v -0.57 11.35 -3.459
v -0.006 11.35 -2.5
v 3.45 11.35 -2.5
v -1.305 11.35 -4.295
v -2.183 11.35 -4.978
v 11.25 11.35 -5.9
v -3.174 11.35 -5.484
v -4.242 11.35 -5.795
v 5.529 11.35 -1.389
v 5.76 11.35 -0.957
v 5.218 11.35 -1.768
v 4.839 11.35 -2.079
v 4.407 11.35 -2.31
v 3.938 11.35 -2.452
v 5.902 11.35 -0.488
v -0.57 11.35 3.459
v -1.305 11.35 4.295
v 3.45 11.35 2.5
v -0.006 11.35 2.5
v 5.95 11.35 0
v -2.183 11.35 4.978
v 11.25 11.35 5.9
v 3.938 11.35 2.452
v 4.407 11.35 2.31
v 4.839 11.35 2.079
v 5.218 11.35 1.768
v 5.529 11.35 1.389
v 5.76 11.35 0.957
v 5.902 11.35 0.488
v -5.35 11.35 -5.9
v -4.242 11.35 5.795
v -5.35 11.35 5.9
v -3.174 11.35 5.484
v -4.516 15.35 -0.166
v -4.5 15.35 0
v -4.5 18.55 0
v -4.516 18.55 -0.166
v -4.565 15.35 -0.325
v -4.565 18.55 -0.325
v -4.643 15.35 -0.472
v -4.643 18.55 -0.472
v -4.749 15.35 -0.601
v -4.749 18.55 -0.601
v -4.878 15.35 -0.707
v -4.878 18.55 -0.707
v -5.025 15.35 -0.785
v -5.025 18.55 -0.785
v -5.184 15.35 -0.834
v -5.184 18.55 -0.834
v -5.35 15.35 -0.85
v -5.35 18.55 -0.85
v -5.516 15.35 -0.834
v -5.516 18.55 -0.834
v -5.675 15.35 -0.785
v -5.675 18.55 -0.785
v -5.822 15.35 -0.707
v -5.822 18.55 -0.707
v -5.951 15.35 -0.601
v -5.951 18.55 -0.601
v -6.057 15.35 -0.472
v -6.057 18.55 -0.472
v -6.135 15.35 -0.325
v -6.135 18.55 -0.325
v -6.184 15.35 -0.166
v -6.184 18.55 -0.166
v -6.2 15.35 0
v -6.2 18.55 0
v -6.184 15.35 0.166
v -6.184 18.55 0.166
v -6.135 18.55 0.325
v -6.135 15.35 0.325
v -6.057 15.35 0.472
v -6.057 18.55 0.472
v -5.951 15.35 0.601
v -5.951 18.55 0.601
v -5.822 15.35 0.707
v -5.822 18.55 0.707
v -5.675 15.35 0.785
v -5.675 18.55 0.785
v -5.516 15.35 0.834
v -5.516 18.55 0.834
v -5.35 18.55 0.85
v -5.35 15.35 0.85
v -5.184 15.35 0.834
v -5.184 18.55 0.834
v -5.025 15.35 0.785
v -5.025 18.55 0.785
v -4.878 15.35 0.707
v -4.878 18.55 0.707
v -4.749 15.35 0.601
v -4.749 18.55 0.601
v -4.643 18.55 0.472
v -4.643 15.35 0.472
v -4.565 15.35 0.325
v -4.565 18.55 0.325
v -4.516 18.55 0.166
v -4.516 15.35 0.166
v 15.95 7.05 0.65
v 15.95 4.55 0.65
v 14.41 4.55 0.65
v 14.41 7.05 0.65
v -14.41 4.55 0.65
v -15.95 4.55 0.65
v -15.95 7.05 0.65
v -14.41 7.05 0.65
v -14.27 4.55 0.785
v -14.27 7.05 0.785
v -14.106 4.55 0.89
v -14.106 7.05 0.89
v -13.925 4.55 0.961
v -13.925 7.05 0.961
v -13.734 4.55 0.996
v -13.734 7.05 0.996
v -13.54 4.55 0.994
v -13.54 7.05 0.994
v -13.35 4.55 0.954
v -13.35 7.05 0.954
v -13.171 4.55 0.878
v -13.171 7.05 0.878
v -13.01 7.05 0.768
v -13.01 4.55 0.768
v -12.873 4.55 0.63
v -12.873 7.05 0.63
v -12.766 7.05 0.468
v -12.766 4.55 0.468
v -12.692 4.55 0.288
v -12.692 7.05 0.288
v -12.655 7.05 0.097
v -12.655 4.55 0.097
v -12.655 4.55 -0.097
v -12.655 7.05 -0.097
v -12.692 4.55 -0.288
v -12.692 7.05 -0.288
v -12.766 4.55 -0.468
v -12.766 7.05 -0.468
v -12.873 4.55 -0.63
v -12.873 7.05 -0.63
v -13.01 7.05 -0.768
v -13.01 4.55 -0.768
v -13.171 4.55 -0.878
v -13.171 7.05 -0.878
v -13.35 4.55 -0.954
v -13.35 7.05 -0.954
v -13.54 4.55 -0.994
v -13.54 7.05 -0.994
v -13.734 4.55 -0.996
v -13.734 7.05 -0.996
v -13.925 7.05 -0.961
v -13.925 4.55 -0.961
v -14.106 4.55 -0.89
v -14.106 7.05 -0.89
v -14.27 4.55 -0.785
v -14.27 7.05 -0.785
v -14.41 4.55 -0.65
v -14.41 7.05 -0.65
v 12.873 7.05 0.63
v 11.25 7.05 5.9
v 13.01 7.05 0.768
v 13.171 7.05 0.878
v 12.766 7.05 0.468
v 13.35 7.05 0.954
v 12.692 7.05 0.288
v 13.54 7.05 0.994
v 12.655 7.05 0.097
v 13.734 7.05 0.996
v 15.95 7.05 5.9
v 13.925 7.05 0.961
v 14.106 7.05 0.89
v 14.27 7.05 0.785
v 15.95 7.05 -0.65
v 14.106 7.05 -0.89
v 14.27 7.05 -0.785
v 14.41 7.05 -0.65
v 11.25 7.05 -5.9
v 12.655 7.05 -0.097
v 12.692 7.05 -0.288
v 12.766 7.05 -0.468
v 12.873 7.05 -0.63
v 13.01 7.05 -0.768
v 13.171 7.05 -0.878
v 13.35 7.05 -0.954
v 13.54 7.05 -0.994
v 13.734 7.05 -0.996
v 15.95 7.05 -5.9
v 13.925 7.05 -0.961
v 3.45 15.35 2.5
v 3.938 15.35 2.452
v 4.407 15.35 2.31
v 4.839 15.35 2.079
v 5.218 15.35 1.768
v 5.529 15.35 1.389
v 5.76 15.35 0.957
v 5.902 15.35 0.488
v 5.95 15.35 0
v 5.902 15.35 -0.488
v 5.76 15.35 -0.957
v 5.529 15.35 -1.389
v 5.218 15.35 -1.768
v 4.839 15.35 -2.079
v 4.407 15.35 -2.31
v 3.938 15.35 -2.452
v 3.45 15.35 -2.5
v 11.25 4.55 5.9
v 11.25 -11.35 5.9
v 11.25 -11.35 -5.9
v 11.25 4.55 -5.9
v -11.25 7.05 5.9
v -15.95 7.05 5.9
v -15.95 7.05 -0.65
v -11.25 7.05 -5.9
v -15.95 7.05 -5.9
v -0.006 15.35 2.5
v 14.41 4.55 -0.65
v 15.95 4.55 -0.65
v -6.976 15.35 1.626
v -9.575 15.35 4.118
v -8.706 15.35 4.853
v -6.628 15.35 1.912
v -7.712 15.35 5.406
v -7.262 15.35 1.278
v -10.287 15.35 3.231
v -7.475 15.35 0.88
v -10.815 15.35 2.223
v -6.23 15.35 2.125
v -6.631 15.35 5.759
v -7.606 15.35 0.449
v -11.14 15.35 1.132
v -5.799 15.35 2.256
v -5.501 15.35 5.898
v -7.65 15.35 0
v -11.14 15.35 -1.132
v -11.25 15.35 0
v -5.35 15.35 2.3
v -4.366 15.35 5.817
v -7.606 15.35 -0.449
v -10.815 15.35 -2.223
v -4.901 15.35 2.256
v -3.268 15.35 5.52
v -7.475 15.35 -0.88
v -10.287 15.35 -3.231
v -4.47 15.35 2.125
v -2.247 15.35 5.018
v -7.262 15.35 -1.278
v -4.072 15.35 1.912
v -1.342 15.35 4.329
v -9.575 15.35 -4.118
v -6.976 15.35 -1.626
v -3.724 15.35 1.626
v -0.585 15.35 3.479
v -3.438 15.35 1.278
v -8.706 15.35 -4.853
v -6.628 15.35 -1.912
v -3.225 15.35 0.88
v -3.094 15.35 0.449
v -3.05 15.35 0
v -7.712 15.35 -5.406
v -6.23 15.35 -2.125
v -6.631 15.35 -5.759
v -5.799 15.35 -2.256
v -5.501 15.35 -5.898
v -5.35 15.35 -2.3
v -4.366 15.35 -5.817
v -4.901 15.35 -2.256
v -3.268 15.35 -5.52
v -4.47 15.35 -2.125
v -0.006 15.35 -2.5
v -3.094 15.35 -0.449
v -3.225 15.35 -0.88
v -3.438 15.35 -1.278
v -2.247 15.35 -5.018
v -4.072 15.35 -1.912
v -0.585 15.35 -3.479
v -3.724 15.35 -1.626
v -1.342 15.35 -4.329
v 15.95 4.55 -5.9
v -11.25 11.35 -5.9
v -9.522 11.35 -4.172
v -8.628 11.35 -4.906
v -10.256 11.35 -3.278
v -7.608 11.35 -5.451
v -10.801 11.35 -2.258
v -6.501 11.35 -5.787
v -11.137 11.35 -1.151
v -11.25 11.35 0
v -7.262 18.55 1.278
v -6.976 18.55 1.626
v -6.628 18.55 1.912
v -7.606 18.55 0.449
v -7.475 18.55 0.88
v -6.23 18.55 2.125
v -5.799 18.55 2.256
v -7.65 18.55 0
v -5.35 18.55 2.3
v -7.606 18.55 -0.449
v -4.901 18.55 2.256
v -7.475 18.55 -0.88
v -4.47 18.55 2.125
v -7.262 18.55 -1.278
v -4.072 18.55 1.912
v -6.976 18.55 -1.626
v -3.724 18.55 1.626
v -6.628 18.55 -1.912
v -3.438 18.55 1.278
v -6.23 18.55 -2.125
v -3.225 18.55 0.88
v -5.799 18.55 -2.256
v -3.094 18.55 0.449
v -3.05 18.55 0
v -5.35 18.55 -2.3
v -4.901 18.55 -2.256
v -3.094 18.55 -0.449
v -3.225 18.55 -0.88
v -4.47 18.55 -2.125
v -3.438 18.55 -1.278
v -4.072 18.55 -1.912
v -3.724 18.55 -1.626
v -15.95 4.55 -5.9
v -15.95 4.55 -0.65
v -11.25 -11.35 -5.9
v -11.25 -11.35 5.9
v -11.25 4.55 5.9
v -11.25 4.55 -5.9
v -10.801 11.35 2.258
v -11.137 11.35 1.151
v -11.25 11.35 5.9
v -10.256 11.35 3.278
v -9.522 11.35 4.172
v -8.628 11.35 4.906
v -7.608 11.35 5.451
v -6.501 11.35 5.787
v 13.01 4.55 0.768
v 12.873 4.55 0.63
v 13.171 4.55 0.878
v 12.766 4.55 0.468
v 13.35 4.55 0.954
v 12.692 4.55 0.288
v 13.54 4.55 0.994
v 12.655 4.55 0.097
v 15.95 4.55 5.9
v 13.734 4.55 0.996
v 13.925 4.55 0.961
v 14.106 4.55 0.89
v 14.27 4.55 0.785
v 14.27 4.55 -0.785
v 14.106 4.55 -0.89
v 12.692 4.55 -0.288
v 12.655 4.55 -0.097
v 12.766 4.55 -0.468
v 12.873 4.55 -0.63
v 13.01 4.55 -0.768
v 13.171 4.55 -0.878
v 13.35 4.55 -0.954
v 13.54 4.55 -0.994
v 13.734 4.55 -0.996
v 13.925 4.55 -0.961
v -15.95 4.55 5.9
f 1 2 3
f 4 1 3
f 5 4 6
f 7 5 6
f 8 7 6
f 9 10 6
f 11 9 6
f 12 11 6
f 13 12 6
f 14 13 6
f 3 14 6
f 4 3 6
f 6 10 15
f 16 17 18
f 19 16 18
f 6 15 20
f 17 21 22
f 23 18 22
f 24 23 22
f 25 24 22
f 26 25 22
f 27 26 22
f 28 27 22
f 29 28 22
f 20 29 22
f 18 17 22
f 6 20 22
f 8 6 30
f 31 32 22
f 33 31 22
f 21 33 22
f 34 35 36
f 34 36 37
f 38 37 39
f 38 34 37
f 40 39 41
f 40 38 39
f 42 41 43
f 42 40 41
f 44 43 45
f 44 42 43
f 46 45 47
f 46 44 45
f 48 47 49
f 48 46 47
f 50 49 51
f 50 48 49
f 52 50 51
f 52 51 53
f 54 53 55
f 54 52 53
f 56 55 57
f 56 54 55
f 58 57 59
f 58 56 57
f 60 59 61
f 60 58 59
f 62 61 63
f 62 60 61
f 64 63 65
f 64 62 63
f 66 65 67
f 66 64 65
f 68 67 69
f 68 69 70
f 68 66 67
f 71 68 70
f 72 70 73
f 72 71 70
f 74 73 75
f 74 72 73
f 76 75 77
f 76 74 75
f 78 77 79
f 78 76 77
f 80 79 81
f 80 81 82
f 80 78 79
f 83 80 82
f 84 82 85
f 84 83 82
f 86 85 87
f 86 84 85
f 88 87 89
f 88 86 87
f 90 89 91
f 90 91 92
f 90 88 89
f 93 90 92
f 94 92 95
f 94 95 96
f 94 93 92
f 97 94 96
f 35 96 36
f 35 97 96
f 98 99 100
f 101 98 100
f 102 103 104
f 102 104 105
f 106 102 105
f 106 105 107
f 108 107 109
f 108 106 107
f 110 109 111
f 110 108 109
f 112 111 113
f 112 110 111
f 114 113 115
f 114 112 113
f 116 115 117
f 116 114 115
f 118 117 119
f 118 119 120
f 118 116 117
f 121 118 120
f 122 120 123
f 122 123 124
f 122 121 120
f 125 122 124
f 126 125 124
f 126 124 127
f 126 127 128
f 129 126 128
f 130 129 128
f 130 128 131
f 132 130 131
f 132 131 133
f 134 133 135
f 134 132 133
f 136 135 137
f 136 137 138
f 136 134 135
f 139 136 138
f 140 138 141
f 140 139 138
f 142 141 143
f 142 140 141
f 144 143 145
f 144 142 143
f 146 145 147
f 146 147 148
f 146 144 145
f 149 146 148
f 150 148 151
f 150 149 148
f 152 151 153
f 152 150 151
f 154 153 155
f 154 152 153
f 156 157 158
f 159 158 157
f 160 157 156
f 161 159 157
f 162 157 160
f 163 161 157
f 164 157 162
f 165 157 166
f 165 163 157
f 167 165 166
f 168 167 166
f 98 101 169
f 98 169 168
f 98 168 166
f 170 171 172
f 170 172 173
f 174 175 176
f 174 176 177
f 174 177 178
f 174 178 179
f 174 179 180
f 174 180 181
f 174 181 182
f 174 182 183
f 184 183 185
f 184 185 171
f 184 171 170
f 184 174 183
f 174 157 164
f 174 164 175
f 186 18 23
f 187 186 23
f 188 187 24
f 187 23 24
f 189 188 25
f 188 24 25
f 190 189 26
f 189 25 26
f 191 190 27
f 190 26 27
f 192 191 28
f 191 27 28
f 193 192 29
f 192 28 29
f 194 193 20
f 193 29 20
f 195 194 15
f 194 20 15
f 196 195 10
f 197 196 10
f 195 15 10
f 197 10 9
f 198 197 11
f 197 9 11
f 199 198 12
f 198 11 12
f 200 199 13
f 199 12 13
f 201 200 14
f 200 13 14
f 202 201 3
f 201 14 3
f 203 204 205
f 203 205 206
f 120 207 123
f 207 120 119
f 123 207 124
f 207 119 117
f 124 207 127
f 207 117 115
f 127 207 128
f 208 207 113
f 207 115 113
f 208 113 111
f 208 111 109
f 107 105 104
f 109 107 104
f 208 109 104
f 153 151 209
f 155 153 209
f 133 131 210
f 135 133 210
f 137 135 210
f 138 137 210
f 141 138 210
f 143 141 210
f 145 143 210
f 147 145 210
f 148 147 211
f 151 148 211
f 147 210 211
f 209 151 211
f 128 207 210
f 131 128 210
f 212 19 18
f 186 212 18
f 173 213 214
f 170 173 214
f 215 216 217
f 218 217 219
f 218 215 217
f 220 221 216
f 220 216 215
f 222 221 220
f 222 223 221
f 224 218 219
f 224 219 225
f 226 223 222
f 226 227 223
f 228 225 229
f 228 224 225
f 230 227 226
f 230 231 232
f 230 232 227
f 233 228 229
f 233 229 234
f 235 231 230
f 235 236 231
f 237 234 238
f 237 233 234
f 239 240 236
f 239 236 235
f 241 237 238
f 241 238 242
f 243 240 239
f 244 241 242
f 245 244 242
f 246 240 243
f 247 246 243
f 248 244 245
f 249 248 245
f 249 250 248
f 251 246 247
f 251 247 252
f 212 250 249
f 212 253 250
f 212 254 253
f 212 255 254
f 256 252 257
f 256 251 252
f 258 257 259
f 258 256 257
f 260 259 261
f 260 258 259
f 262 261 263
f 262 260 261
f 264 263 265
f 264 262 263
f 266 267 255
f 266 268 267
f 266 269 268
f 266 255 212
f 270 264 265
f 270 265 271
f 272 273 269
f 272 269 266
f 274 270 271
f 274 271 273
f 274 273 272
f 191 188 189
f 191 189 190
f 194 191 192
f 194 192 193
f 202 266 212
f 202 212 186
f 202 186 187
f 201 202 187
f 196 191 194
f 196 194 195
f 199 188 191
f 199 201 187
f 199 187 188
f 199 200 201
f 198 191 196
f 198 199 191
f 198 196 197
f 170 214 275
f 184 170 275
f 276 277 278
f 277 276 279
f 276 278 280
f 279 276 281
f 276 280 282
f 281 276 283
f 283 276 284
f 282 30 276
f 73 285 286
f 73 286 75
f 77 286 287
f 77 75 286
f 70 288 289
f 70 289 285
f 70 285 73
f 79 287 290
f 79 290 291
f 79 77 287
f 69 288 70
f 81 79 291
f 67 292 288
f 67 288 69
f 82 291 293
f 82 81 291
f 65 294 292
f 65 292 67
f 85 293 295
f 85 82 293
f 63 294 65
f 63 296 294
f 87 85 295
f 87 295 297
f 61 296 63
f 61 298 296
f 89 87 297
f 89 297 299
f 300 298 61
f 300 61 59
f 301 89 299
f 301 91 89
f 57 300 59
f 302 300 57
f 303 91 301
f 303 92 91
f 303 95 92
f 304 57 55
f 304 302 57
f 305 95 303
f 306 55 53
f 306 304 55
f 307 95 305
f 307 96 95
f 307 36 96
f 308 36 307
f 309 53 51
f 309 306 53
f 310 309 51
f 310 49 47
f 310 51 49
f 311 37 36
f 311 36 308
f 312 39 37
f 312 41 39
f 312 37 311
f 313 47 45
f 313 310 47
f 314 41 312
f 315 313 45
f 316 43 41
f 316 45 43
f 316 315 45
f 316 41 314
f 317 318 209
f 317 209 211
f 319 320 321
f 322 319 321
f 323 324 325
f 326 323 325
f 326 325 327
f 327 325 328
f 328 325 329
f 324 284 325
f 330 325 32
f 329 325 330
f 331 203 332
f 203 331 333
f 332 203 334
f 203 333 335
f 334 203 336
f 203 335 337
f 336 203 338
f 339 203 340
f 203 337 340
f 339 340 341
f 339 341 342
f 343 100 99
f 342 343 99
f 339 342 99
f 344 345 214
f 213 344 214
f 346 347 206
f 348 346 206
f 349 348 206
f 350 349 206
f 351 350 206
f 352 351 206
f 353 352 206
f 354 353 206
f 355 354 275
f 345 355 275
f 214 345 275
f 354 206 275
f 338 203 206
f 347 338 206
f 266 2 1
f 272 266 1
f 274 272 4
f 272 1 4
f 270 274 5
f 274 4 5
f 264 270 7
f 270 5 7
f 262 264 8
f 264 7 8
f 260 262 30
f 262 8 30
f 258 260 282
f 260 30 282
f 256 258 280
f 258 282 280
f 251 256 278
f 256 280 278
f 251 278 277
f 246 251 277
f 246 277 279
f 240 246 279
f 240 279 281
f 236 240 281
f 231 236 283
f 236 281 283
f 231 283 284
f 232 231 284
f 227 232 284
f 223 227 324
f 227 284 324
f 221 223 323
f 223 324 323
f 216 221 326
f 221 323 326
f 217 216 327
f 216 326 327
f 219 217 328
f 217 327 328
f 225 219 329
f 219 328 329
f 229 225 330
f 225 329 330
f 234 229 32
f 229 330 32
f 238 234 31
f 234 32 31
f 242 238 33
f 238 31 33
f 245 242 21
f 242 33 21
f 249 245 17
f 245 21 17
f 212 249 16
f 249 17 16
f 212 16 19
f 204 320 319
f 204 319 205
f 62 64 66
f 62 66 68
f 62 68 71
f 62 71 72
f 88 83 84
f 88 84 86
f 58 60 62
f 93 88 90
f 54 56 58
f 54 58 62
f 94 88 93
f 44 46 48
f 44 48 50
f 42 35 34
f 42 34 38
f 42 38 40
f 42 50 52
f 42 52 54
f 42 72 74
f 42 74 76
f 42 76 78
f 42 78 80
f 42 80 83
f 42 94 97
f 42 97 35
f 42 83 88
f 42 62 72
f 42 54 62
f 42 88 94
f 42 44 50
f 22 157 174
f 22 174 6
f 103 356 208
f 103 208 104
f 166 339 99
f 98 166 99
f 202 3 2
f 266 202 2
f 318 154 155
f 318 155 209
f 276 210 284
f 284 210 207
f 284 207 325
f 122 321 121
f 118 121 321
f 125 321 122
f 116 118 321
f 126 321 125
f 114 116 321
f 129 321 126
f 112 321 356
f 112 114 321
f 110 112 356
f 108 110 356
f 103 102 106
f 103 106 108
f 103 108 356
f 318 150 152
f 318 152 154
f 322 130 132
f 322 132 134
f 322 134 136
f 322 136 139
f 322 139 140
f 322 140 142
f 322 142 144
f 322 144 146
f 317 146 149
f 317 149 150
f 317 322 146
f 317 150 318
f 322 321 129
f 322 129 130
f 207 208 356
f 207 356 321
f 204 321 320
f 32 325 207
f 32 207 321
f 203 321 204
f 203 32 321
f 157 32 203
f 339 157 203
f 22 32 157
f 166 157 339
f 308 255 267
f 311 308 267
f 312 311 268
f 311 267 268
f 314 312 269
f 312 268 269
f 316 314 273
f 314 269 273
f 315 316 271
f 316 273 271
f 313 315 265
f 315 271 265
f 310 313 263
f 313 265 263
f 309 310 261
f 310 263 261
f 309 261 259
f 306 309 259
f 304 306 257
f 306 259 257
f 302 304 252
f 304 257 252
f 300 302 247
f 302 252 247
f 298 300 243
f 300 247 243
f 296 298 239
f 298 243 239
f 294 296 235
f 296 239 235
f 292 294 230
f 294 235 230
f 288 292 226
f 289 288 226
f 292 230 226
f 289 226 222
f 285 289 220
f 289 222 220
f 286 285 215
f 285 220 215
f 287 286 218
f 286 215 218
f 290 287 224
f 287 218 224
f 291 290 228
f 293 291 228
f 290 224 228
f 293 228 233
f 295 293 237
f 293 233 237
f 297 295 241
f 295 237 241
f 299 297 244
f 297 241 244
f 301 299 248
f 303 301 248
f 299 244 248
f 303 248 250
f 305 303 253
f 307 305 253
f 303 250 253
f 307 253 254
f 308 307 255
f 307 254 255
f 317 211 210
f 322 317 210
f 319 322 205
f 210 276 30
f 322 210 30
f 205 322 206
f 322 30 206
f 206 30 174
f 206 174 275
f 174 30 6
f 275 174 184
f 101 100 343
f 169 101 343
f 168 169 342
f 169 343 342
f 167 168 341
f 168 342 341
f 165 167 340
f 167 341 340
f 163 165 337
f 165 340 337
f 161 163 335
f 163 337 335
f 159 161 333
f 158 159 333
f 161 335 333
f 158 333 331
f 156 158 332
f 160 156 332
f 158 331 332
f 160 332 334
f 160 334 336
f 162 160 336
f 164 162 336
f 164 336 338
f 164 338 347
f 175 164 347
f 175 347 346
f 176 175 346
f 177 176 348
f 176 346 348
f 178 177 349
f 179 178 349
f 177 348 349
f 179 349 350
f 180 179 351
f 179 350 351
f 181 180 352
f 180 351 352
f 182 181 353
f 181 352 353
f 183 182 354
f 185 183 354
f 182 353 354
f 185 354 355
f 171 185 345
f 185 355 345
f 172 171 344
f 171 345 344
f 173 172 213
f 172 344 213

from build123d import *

# Parameters (mm, degrees)
SKETCH2_W           = 22.5
SKETCH2_H           = 22.7
BOSS_EXTRUDE1_DEPTH = 5.9
BOSS_EXTRUDE2_DEPTH = 2.5
BOSS_EXTRUDE3_DEPTH = 4
SKETCH5_R           = 2.3
SKETCH5_R_2         = 0.85
BOSS_EXTRUDE4_DEPTH = 3.2


with BuildPart() as part:
    # Sketch2 → Boss-Extrude1 (new body, symmetric)
    with BuildSketch(Plane.XY):
        Rectangle(SKETCH2_W, SKETCH2_H)
    extrude(amount=BOSS_EXTRUDE1_DEPTH, both=True)

    # Sketch3 → Boss-Extrude2 (add)
    with BuildSketch(Plane(origin=(0, 4.55, 0), x_dir=(-1, 0, 0), z_dir=(0, -1, 0))):
        with BuildLine():
            Line((14.409934208, 0.65), (15.95, 0.65))
            Line((15.95, 0.65), (15.95, 5.9))
            Line((15.95, 5.9), (11.25, 5.9))
            Line((11.25, 5.9), (11.25, -5.9))
            Line((11.25, -5.9), (15.95, -5.9))
            Line((15.95, -5.9), (15.95, -0.65))
            Line((15.95, -0.65), (14.409934208, -0.65))
            ThreePointArc((14.409934208, -0.65), (12.65, 0), (14.409934208, 0.65))
        make_face()
        with BuildLine():
            Line((-11.25, -5.9), (-15.95, -5.9))
            Line((-15.95, -5.9), (-15.95, -0.65))
            Line((-15.95, -0.65), (-14.409934208, -0.65))
            ThreePointArc((-14.409934208, -0.65), (-12.65, 0), (-14.409934208, 0.65))
            Line((-14.409934208, 0.65), (-15.95, 0.65))
            Line((-15.95, 0.65), (-15.95, 5.9))
            Line((-15.95, 5.9), (-11.25, 5.9))
            Line((-11.25, 5.9), (-11.25, -5.9))
        make_face()
    extrude(amount=-BOSS_EXTRUDE2_DEPTH)

    # Sketch4 → Boss-Extrude3 (add)
    with BuildSketch(Plane(origin=(0, 11.35, 0), x_dir=(1, 0, 0), z_dir=(0, 1, 0))):
        with BuildLine():
            Line((3.45, 2.5), (-0.005844314, 2.5))
            ThreePointArc((-0.005844314, 2.5), (-11.25, 0), (-0.005844314, -2.5))
            Line((-0.005844314, -2.5), (3.45, -2.5))
            ThreePointArc((3.45, -2.5), (5.95, 0), (3.45, 2.5))
        make_face()
    extrude(amount=BOSS_EXTRUDE3_DEPTH)

    # Sketch5 → Boss-Extrude4 (add)
    with BuildSketch(Plane(origin=(0, 15.35, 0), x_dir=(1, 0, 0), z_dir=(0, 1, 0))):
        with Locations((-5.35, 0)):
            Circle(SKETCH5_R)
        with Locations((-5.35, 0)):
            Circle(SKETCH5_R_2, mode=Mode.SUBTRACT)
    extrude(amount=BOSS_EXTRUDE4_DEPTH)


solid = part.part
